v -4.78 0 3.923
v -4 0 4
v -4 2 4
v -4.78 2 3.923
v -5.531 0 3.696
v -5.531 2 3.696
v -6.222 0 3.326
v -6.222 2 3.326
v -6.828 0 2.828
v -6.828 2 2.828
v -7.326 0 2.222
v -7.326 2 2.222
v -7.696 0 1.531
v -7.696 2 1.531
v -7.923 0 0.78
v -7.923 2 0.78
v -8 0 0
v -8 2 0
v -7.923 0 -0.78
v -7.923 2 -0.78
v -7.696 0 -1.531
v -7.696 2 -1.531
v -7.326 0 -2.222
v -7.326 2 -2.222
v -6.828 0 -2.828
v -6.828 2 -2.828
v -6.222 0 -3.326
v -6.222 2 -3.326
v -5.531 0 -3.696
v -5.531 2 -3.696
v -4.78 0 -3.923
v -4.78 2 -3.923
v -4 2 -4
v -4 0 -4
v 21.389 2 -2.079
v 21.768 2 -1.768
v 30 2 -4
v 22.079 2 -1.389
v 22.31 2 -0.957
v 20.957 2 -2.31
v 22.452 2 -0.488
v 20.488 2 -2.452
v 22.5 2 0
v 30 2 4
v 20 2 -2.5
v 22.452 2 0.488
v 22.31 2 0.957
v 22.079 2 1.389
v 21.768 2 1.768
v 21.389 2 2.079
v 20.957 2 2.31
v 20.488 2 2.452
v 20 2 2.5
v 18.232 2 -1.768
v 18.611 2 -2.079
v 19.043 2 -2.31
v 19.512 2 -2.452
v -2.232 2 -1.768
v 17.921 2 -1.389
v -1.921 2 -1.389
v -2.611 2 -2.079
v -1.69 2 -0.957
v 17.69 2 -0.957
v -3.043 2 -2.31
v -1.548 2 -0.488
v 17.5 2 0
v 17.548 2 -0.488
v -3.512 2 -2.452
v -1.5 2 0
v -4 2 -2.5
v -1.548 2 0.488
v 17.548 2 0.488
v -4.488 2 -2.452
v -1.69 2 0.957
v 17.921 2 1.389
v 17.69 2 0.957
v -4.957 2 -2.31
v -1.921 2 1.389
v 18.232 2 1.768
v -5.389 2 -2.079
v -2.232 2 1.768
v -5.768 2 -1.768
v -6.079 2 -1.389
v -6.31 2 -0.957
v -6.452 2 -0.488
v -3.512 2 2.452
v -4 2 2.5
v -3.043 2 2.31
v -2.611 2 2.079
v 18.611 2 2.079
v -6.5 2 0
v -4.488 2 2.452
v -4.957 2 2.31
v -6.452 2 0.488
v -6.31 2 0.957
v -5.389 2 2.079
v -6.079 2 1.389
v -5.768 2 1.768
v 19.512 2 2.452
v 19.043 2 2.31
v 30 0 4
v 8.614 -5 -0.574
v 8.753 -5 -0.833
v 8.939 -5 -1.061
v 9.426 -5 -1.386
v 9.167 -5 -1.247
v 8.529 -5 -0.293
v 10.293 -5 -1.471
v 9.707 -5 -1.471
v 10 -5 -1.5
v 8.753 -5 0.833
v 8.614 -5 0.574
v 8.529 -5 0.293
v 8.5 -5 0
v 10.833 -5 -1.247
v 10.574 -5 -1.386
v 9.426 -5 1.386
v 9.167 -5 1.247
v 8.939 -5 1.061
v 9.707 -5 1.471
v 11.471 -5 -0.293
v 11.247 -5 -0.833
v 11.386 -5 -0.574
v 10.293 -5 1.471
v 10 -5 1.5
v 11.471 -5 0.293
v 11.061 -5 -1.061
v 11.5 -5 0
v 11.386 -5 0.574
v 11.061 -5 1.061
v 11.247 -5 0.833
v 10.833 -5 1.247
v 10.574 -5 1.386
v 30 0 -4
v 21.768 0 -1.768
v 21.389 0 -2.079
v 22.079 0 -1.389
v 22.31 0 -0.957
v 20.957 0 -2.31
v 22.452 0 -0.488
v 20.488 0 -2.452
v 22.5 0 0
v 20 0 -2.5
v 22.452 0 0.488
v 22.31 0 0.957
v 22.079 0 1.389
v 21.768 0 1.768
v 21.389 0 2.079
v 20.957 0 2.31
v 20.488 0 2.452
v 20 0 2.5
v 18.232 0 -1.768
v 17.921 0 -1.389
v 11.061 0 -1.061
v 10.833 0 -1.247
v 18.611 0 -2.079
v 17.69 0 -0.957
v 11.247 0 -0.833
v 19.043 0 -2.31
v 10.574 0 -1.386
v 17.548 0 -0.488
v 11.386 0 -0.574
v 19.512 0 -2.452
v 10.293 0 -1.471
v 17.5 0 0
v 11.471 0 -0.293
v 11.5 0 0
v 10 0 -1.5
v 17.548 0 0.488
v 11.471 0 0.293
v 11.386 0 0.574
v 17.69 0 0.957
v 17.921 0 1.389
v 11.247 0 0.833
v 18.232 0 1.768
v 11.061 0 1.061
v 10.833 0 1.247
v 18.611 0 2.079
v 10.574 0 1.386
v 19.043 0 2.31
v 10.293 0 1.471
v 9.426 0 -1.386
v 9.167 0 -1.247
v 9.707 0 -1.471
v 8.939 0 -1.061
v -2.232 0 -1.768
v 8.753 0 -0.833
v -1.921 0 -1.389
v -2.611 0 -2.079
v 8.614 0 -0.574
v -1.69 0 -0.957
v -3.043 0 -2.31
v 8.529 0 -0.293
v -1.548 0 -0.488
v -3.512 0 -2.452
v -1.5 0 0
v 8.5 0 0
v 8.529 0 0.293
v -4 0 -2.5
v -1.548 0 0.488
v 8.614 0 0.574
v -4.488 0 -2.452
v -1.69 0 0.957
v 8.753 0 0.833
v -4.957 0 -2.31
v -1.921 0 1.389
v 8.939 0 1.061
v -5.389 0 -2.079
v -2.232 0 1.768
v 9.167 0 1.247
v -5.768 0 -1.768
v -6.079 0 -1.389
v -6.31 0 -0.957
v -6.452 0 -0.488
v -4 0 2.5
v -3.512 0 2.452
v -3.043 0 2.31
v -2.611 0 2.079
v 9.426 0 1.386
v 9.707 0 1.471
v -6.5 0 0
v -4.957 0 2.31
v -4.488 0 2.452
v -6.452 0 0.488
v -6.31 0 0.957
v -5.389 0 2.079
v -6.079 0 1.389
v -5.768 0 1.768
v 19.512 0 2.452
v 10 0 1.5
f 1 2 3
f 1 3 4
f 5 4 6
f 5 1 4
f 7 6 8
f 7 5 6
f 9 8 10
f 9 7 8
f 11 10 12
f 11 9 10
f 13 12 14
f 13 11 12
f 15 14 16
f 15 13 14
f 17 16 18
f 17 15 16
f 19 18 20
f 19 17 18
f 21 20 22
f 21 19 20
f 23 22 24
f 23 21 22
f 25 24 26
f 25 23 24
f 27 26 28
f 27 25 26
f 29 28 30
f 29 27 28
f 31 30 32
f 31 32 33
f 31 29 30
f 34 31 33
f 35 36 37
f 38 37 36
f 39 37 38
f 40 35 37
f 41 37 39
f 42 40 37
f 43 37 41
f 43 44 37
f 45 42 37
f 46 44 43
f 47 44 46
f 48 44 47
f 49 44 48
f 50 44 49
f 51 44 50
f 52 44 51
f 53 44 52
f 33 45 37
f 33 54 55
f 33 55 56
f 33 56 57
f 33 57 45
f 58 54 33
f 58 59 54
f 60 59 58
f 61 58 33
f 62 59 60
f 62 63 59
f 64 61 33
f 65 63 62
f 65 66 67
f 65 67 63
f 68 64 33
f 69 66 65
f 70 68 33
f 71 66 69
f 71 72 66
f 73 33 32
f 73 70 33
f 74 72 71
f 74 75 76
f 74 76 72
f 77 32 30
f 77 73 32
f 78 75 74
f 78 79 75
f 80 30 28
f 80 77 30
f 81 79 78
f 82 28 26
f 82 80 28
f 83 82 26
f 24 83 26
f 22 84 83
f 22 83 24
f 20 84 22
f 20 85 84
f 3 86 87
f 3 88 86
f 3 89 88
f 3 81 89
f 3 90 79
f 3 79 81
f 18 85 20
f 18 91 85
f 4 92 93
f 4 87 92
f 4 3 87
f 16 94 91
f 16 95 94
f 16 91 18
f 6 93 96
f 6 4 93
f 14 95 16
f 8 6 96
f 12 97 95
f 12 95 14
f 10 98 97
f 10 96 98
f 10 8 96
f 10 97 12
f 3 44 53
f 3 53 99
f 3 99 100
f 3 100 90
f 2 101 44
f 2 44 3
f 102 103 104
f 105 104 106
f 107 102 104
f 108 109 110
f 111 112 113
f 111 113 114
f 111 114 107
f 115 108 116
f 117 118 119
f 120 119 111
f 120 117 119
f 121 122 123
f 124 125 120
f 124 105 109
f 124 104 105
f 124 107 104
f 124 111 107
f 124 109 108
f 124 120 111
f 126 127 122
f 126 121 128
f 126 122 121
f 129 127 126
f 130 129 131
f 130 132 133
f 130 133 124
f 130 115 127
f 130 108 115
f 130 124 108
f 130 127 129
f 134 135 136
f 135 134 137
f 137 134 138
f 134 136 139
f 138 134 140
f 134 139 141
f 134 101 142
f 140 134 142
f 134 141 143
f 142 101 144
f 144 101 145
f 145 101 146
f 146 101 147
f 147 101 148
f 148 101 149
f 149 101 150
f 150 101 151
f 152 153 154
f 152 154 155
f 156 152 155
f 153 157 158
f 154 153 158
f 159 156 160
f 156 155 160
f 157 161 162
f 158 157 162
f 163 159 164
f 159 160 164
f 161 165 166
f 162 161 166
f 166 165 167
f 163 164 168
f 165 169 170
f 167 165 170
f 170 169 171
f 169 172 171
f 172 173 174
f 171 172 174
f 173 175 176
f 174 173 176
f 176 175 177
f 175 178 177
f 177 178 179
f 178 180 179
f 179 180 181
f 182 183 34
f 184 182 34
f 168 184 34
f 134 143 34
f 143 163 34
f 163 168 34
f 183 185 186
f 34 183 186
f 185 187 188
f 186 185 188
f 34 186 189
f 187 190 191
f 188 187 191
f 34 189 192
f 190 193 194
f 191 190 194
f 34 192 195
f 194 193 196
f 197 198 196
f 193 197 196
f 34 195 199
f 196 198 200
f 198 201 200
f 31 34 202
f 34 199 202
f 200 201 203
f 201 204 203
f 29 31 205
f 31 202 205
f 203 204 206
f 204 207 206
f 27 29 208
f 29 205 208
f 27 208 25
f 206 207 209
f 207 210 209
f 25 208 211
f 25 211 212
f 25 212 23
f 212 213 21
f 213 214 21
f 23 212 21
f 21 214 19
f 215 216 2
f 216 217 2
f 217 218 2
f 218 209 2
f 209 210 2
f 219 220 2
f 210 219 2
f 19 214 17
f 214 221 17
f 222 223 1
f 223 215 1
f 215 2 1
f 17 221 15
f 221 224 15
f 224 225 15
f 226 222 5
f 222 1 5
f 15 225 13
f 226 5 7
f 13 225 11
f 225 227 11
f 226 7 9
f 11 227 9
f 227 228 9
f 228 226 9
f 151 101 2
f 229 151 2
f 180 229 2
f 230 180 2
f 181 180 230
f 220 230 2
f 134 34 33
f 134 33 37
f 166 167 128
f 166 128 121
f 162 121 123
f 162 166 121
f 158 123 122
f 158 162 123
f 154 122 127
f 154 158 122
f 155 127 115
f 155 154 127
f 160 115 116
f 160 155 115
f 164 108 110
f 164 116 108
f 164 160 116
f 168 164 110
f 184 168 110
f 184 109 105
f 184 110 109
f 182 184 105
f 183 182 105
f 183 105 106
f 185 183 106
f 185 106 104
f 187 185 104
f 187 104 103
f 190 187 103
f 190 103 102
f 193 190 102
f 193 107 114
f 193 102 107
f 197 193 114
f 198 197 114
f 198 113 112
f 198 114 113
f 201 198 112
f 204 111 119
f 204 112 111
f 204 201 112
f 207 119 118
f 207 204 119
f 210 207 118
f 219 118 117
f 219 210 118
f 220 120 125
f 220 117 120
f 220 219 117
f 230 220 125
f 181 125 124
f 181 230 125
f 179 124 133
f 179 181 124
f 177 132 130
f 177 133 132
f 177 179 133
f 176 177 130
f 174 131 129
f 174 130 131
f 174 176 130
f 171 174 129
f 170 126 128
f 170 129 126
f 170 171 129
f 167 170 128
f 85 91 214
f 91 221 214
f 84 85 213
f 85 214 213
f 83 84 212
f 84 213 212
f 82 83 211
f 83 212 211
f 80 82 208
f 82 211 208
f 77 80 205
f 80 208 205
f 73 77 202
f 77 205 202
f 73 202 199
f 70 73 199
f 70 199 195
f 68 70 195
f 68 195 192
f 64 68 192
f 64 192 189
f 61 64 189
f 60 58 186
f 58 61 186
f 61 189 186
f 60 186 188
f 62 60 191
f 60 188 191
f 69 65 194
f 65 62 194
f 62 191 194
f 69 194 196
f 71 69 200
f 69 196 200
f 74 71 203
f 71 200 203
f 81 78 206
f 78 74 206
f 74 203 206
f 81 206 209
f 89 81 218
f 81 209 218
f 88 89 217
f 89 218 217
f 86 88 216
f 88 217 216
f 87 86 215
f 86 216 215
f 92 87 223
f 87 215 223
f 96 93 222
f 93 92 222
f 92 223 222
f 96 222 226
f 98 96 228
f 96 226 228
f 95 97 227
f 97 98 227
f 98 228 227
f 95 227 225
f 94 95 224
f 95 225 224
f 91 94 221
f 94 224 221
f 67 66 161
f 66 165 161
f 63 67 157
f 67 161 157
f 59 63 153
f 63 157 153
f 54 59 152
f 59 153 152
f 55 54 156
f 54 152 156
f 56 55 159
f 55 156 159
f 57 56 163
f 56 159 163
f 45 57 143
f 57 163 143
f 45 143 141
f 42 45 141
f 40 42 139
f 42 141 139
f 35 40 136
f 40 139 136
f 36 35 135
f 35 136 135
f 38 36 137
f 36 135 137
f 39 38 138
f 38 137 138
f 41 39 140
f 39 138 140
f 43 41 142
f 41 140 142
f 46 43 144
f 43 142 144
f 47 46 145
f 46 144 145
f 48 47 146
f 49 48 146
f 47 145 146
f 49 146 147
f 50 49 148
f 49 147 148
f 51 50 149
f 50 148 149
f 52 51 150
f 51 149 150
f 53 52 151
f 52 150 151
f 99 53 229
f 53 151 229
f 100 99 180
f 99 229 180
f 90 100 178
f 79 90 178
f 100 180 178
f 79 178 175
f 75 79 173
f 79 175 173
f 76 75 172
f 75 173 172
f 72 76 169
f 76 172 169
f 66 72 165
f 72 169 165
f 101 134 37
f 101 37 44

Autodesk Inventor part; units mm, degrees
ref_plane "YZ Plane" through (0, 0, 0) normal (1, 0, 0) x (0, 1, 0)
ref_plane "XZ Plane" through (0, 0, 0) normal (0, 1, 0) x (-1, 0, 0)
ref_plane "XY Plane" through (0, 0, 0) normal (0, 0, 1) x (1, 0, 0)
sketch "Sketch1" plane through (0, 0, 0) normal (0, 1, 0) x (-1, 0, 0)
  line L0 (0, 4) -> (-20, 4)
  line L1 (-20, 4) -> (-20, -4)
  line L2 (-20, -4) -> (0, -4)
  circle A0 centre (-20, 0) radius 4
  circle A1 centre (-20, 0) radius 2.5
  line L3 (-20, -4) -> (-30, -4)
  line L4 (-30, -4) -> (-30, 4)
  line L5 (-30, 4) -> (-20, 4)
  line L6 (-20, 4) -> (-20, -4)
  circle A2 centre (4, 0) radius 4
  circle A3 centre (4, 0) radius 2.5
  line L7 (0, 4) -> (4, 4)
  line L8 (4, -4) -> (0, -4)
  point P0 (-20, -2.5)
  point P1 (-20, 2.5)
  dimension "d32" = 20
  dimension "d34" = 5
  dimension "d47" = 10
  dimension "d48" = 5
extrude "Extrusion1" add sketch "Sketch1" along normal blind 2 contours L7 A2 L8 L2 A0 L0 | A0 L1 A1 | L1 A1 A0 | A0 L3 L4 L5 | A2
thread "Thread2" size "M5x0.8" class "6H" standard "ANSI Metric M Profile" full length
sketch "Sketch4" plane through (0, 0, 0) normal (0, -1, 0) x (1, 0, 0)
  circle A0 centre (10, 0) radius 1.5
  point P0 (0, 0)
  dimension "d46" = 3
extrude "Extrusion5" add sketch "Sketch4" along normal blind 5
thread "Thread3" size "M5x0.8" class "6H" standard "ANSI Metric M Profile" full length
properties part number "link"
